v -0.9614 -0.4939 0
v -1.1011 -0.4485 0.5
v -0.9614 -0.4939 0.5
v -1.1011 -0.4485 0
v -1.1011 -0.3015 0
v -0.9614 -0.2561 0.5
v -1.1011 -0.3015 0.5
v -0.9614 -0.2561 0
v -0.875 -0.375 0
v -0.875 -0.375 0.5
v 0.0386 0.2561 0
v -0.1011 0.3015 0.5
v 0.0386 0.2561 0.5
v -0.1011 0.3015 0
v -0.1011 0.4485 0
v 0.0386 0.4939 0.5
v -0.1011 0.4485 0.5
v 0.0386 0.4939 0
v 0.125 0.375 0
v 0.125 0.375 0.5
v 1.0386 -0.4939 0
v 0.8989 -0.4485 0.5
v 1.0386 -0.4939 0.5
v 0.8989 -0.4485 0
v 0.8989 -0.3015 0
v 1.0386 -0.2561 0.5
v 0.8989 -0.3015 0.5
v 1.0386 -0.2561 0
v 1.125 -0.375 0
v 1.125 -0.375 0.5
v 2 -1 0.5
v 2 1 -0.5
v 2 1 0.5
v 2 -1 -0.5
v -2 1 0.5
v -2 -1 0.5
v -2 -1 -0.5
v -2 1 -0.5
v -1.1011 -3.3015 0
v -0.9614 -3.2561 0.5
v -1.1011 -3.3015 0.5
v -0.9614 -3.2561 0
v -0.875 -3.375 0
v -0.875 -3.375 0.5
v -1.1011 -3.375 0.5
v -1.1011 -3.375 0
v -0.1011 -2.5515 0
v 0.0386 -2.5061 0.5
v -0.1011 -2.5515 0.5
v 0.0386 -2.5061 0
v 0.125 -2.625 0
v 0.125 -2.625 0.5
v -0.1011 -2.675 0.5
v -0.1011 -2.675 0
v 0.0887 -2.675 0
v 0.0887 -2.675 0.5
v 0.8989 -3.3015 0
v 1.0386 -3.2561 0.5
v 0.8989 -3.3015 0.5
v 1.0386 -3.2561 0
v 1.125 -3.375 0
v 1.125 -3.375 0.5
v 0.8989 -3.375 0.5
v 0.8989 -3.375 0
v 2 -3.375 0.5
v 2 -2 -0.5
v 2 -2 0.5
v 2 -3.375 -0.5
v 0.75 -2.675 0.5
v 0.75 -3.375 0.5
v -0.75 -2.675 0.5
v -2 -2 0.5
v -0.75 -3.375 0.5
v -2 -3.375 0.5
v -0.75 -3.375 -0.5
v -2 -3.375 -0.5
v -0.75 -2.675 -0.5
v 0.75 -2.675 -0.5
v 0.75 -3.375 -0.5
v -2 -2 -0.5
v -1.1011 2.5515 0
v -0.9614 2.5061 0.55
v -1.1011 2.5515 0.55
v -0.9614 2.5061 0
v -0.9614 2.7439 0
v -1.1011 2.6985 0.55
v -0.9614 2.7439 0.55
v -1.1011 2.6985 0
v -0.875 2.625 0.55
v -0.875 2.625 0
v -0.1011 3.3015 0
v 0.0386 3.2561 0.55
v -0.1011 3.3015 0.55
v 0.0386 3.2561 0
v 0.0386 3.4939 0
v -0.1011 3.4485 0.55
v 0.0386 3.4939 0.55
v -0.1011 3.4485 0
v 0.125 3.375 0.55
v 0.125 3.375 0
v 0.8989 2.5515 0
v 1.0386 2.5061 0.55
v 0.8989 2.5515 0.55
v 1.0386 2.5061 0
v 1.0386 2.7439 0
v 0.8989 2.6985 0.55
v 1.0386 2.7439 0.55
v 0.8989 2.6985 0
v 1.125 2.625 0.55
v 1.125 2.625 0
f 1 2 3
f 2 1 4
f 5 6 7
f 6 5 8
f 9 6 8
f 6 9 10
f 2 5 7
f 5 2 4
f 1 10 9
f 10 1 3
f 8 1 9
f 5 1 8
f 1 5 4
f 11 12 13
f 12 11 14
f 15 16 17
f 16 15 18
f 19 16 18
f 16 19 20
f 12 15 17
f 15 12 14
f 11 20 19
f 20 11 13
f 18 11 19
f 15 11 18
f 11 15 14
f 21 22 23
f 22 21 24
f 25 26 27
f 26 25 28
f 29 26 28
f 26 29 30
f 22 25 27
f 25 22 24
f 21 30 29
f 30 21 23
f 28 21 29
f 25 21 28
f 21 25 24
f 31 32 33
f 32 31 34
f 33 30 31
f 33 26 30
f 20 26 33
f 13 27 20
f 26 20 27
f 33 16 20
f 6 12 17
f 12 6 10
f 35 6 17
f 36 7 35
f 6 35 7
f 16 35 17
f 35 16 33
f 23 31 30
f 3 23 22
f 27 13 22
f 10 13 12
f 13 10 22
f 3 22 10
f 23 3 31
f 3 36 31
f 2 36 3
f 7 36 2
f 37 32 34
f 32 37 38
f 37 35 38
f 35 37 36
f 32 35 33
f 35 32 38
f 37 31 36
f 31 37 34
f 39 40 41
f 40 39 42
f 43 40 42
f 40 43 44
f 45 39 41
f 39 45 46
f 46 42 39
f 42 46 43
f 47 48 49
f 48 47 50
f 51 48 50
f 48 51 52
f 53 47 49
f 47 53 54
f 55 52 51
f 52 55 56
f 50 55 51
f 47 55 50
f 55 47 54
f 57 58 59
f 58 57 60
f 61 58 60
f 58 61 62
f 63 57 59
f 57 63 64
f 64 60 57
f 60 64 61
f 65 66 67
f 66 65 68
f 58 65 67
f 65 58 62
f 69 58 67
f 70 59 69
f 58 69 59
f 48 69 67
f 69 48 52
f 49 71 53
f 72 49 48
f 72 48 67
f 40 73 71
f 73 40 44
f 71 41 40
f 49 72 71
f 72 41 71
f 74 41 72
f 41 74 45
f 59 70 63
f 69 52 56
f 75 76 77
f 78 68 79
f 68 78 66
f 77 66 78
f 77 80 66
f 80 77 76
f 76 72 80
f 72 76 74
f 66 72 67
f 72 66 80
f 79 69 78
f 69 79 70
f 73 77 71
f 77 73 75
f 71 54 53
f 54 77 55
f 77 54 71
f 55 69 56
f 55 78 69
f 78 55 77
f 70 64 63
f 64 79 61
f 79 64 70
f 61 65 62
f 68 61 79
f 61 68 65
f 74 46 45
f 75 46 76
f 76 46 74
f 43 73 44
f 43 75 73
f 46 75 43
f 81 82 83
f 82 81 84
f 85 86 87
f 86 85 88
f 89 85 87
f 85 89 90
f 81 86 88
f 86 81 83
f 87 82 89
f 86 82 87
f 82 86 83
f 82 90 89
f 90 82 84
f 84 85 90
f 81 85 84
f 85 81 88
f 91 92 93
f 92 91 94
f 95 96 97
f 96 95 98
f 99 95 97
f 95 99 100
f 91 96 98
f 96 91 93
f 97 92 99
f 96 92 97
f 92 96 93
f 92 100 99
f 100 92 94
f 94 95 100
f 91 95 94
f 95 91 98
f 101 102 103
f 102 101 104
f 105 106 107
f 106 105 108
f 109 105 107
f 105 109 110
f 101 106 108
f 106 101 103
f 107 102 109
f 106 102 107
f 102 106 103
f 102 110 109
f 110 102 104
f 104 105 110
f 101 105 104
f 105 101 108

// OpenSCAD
/*
    It's not clear how to handle situations where more than one cutaway is needed. 

    1) Just a note ("3 plcs") if they are all the same
    2) Non-planar cut (standard drafting practice, I think)
    3) Transparent view (pretty, but hard to automatically generate)
*/

LENGTH = 4;
HOLES = 3;
OFFSET = .05;
// actual object
difference() {
   cube([LENGTH, 2, 1], center=true);

   for (i = [1:HOLES]) {
       translate([-LENGTH / 2 + i / (HOLES + 1) * LENGTH, 0, 0])

	   if (floor(i / 2) == i / 2) {
		   translate([0, .375, 0])
		   cylinder(r=.125, h=.5 + OFFSET);
	   } else {
		   translate([0, -.375, 0])
		   cylinder(r=.125, h=.5 + OFFSET);
	   }
   }
}

// non-planar cut view
translate([0,-3,0])
difference() {
   difference() {
      cube([LENGTH, 2, 1], center=true);

      for (i = [1:HOLES]) {
          translate([-LENGTH / 2 + i / (HOLES + 1) * LENGTH, 0, 0])

      if (floor(i / 2) == i / 2) {
	     translate([0, .375, 0])
		 cylinder(r=.125, h=.5 + OFFSET);
	  } else {
	     translate([0, -.375, 0])
		 cylinder(r=.125, h=.5 + OFFSET);
	  }
   }
   translate([-.75,-.675,-1]) cube([1.5,1,2+OFFSET]);
   translate([-3,-1.375,-1]) cube([6,1,2+OFFSET]);
}

}
// transparent view
translate([0,3,0])
union() {
   %cube([LENGTH, 2, 1], center=true);

   for (i = [1:HOLES]) {
       translate([-LENGTH / 2 + i / (HOLES + 1) * LENGTH, 0, 0])

	   if (floor(i / 2) == i / 2) {
		   translate([0, .375, 0])
		   cylinder(r=.125, h=.5 + OFFSET);
	   } else {
		   translate([0, -.375, 0])
		   cylinder(r=.125, h=.5 + OFFSET);
	   }
   }
}
